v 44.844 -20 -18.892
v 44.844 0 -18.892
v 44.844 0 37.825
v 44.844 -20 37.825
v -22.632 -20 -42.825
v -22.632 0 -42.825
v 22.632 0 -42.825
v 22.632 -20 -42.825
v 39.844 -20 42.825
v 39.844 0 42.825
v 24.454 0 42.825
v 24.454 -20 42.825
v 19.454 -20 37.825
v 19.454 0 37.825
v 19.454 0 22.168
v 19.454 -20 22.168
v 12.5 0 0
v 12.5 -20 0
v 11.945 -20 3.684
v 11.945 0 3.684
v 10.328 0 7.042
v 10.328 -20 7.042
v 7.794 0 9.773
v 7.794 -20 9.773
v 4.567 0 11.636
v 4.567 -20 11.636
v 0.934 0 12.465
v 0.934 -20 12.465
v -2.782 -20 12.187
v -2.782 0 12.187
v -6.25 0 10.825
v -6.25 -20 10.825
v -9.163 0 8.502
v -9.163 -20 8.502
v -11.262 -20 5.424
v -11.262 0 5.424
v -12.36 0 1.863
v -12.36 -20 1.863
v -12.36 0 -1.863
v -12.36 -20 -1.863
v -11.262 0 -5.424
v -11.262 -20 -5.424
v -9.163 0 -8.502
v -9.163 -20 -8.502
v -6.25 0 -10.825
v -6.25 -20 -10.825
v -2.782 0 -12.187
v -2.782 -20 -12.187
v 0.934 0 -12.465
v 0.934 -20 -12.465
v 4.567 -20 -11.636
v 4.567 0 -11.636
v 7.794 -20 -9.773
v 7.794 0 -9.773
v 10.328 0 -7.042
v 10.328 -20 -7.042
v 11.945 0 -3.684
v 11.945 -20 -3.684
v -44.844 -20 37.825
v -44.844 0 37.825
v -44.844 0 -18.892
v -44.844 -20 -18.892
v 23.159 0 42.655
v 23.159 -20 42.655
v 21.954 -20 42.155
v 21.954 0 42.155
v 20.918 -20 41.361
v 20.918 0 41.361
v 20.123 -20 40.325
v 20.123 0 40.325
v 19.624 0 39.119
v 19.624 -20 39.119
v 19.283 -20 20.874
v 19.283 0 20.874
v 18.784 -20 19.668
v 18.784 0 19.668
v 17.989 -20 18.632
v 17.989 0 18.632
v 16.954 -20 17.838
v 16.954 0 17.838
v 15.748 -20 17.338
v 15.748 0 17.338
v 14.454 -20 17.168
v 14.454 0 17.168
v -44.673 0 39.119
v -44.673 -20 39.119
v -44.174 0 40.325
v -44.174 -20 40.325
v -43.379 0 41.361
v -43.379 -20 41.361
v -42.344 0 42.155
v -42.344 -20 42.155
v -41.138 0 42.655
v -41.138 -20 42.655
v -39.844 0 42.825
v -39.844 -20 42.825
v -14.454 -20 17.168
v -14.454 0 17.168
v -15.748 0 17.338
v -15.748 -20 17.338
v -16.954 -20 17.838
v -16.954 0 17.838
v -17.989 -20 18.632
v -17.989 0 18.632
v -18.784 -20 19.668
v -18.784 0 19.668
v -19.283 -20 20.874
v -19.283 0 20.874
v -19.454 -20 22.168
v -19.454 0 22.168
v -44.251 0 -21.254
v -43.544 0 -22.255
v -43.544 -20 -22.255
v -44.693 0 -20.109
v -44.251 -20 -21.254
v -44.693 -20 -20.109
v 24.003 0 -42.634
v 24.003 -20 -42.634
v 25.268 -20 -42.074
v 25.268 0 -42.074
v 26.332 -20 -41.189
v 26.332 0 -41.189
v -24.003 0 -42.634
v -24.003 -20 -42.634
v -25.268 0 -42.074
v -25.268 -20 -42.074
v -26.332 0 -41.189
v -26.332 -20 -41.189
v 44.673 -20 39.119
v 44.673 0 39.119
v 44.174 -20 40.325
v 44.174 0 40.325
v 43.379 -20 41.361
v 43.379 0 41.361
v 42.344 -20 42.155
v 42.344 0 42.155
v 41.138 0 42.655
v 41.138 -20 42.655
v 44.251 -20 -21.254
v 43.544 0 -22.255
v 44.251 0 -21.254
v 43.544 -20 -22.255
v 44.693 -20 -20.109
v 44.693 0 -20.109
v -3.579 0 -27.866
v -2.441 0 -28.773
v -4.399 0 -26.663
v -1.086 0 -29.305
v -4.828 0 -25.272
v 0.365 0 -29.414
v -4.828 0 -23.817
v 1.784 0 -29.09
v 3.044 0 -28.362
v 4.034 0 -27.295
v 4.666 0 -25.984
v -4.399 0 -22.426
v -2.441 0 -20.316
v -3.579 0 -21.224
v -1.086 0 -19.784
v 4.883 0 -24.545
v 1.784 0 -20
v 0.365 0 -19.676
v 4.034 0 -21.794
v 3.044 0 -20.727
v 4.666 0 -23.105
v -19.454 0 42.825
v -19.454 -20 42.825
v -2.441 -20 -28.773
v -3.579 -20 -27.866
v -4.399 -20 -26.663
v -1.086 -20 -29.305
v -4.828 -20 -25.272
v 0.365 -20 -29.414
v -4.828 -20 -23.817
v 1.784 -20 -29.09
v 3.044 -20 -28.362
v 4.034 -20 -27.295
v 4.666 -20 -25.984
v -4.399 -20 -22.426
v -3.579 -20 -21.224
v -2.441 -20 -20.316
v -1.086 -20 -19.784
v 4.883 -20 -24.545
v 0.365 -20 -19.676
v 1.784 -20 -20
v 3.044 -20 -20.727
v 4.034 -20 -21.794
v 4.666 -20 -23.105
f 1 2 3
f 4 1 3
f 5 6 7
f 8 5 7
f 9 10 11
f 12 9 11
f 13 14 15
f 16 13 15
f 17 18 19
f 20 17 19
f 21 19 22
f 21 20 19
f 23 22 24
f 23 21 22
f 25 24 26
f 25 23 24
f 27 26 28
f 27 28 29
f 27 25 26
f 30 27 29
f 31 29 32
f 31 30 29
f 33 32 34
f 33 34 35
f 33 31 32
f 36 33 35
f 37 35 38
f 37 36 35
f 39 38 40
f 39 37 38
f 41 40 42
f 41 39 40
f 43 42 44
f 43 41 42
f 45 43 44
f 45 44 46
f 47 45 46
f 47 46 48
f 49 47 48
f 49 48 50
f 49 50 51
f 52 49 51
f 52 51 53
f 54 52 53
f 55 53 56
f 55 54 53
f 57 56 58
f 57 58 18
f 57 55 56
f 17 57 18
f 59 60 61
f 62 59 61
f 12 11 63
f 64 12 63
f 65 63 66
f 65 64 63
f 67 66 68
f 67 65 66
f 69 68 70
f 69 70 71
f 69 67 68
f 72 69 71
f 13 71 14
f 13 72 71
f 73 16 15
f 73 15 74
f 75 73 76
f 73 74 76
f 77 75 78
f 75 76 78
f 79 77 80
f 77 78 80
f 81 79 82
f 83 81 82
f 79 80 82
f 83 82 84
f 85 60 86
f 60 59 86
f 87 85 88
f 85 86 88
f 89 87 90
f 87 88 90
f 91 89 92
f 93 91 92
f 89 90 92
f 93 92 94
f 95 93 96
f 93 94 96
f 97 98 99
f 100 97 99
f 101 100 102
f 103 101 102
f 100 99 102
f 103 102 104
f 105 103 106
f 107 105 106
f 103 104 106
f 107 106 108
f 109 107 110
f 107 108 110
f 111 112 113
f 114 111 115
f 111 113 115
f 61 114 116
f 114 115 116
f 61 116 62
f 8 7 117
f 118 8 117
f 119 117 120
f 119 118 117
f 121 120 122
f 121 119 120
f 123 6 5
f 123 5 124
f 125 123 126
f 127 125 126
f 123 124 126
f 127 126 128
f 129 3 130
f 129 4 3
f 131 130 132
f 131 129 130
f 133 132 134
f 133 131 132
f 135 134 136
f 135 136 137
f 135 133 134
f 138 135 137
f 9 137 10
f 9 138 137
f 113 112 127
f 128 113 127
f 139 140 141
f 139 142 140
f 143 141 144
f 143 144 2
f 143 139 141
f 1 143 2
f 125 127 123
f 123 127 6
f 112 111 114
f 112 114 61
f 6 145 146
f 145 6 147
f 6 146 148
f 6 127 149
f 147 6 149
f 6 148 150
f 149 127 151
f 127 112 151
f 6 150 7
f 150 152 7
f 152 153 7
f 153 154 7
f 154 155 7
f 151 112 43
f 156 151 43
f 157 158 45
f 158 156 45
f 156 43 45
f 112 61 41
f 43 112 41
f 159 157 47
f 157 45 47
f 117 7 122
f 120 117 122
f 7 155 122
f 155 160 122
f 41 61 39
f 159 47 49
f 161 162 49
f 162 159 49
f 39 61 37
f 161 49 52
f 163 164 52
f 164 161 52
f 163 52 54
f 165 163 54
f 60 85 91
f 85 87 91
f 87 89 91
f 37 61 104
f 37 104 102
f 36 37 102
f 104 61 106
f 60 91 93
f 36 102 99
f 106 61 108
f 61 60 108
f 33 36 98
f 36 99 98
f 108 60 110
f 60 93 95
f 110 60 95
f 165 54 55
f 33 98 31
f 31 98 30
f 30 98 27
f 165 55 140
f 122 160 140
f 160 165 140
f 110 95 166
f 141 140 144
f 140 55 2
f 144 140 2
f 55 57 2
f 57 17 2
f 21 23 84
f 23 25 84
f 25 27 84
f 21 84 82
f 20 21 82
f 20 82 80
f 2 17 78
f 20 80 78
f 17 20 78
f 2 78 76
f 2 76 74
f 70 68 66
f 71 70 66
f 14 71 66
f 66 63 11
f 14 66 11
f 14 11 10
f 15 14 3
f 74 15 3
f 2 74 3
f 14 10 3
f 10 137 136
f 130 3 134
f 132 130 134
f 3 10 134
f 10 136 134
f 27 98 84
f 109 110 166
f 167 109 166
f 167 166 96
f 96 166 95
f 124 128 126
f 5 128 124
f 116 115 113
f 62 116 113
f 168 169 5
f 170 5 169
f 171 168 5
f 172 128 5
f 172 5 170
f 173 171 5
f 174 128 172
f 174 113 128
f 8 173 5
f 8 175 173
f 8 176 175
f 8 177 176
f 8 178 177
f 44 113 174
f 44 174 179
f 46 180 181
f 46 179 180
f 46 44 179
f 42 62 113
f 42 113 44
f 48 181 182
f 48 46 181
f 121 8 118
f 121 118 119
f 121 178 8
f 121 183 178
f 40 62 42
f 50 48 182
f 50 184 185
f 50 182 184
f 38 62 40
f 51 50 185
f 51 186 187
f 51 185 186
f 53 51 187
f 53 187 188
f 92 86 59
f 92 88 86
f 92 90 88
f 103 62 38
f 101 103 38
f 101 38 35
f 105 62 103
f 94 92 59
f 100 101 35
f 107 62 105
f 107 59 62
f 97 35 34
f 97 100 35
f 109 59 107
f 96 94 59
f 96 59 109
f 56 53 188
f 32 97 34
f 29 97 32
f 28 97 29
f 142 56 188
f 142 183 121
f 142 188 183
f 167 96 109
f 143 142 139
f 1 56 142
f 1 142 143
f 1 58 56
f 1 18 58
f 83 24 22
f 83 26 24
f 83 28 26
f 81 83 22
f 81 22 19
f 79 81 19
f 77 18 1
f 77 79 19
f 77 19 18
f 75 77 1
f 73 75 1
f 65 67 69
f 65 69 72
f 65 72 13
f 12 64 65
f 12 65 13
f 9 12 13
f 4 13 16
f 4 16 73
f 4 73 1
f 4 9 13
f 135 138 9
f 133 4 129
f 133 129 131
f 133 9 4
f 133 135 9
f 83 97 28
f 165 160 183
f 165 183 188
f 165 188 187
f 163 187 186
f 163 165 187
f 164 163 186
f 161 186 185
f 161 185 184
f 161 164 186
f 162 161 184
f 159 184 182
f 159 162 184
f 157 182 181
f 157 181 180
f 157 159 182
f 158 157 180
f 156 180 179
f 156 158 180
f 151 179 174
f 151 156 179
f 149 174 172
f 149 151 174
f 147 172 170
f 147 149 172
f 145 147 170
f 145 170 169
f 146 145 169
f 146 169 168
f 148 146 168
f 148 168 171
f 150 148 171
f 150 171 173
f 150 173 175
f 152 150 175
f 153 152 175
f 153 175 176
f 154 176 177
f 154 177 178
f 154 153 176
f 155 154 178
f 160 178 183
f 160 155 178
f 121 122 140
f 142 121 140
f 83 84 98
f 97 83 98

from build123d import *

# Parameters (mm, degrees)
F0_R     = 4.8825627193
F0_R_2   = 12.5
F1_DEPTH = 20
F2_R     = 5


with BuildPart() as f1:
    # F0 (on Front) → F1 (new body)
    with BuildSketch(Plane.XZ):
        with BuildLine():
            Line((-24.8438301682, -42.8251363337), (24.8438301682, -42.8251363337))
            Line((24.8438301682, -42.8251363337), (44.8438301682, -20.8251363337))
            Line((44.8438301682, -20.8251363337), (44.8438301682, 42.8251363337))
            Line((44.8438301682, 42.8251363337), (19.4535404444, 42.8251363337))
            Line((19.4535404444, 42.8251363337), (19.4535404444, 22.1680208296))
            ThreePointArc((19.4535404444, 22.1680208296), (17.9890743503, 18.6324869236), (14.4535404444, 17.1680208296))
            Line((14.4535404444, 17.1680208296), (-14.4535404444, 17.1680208296))
            ThreePointArc((-14.4535404444, 17.1680208296), (-17.9890743503, 18.6324869236), (-19.4535404444, 22.1680208296))
            Line((-19.4535404444, 22.1680208296), (-19.4535404444, 42.8251363337))
            Line((-19.4535404444, 42.8251363337), (-44.8438301682, 42.8251363337))
            Line((-44.8438301682, 42.8251363337), (-44.8438301682, -20.8251363337))
            Line((-44.8438301682, -20.8251363337), (-24.8438301682, -42.8251363337))
        make_face()
        with Locations((0, -24.5446097106)):
            Circle(F0_R, mode=Mode.SUBTRACT)
        Circle(F0_R_2, mode=Mode.SUBTRACT)
    extrude(amount=F1_DEPTH)

    # F2
    f2_edges = [f1.edges().sort_by_distance(p)[0] for p in [
        (44.84383, -10, 42.825136),
        (-24.84383, -10, -42.825136),
        (24.84383, -10, -42.825136),
        (44.84383, -10, -20.825136),
        (19.45354, -10, 42.825136),
        (-44.84383, -10, 42.825136),
        (-44.84383, -10, -20.825136),
    ]]
    fillet(f2_edges, radius=F2_R)


solid = f1.part
